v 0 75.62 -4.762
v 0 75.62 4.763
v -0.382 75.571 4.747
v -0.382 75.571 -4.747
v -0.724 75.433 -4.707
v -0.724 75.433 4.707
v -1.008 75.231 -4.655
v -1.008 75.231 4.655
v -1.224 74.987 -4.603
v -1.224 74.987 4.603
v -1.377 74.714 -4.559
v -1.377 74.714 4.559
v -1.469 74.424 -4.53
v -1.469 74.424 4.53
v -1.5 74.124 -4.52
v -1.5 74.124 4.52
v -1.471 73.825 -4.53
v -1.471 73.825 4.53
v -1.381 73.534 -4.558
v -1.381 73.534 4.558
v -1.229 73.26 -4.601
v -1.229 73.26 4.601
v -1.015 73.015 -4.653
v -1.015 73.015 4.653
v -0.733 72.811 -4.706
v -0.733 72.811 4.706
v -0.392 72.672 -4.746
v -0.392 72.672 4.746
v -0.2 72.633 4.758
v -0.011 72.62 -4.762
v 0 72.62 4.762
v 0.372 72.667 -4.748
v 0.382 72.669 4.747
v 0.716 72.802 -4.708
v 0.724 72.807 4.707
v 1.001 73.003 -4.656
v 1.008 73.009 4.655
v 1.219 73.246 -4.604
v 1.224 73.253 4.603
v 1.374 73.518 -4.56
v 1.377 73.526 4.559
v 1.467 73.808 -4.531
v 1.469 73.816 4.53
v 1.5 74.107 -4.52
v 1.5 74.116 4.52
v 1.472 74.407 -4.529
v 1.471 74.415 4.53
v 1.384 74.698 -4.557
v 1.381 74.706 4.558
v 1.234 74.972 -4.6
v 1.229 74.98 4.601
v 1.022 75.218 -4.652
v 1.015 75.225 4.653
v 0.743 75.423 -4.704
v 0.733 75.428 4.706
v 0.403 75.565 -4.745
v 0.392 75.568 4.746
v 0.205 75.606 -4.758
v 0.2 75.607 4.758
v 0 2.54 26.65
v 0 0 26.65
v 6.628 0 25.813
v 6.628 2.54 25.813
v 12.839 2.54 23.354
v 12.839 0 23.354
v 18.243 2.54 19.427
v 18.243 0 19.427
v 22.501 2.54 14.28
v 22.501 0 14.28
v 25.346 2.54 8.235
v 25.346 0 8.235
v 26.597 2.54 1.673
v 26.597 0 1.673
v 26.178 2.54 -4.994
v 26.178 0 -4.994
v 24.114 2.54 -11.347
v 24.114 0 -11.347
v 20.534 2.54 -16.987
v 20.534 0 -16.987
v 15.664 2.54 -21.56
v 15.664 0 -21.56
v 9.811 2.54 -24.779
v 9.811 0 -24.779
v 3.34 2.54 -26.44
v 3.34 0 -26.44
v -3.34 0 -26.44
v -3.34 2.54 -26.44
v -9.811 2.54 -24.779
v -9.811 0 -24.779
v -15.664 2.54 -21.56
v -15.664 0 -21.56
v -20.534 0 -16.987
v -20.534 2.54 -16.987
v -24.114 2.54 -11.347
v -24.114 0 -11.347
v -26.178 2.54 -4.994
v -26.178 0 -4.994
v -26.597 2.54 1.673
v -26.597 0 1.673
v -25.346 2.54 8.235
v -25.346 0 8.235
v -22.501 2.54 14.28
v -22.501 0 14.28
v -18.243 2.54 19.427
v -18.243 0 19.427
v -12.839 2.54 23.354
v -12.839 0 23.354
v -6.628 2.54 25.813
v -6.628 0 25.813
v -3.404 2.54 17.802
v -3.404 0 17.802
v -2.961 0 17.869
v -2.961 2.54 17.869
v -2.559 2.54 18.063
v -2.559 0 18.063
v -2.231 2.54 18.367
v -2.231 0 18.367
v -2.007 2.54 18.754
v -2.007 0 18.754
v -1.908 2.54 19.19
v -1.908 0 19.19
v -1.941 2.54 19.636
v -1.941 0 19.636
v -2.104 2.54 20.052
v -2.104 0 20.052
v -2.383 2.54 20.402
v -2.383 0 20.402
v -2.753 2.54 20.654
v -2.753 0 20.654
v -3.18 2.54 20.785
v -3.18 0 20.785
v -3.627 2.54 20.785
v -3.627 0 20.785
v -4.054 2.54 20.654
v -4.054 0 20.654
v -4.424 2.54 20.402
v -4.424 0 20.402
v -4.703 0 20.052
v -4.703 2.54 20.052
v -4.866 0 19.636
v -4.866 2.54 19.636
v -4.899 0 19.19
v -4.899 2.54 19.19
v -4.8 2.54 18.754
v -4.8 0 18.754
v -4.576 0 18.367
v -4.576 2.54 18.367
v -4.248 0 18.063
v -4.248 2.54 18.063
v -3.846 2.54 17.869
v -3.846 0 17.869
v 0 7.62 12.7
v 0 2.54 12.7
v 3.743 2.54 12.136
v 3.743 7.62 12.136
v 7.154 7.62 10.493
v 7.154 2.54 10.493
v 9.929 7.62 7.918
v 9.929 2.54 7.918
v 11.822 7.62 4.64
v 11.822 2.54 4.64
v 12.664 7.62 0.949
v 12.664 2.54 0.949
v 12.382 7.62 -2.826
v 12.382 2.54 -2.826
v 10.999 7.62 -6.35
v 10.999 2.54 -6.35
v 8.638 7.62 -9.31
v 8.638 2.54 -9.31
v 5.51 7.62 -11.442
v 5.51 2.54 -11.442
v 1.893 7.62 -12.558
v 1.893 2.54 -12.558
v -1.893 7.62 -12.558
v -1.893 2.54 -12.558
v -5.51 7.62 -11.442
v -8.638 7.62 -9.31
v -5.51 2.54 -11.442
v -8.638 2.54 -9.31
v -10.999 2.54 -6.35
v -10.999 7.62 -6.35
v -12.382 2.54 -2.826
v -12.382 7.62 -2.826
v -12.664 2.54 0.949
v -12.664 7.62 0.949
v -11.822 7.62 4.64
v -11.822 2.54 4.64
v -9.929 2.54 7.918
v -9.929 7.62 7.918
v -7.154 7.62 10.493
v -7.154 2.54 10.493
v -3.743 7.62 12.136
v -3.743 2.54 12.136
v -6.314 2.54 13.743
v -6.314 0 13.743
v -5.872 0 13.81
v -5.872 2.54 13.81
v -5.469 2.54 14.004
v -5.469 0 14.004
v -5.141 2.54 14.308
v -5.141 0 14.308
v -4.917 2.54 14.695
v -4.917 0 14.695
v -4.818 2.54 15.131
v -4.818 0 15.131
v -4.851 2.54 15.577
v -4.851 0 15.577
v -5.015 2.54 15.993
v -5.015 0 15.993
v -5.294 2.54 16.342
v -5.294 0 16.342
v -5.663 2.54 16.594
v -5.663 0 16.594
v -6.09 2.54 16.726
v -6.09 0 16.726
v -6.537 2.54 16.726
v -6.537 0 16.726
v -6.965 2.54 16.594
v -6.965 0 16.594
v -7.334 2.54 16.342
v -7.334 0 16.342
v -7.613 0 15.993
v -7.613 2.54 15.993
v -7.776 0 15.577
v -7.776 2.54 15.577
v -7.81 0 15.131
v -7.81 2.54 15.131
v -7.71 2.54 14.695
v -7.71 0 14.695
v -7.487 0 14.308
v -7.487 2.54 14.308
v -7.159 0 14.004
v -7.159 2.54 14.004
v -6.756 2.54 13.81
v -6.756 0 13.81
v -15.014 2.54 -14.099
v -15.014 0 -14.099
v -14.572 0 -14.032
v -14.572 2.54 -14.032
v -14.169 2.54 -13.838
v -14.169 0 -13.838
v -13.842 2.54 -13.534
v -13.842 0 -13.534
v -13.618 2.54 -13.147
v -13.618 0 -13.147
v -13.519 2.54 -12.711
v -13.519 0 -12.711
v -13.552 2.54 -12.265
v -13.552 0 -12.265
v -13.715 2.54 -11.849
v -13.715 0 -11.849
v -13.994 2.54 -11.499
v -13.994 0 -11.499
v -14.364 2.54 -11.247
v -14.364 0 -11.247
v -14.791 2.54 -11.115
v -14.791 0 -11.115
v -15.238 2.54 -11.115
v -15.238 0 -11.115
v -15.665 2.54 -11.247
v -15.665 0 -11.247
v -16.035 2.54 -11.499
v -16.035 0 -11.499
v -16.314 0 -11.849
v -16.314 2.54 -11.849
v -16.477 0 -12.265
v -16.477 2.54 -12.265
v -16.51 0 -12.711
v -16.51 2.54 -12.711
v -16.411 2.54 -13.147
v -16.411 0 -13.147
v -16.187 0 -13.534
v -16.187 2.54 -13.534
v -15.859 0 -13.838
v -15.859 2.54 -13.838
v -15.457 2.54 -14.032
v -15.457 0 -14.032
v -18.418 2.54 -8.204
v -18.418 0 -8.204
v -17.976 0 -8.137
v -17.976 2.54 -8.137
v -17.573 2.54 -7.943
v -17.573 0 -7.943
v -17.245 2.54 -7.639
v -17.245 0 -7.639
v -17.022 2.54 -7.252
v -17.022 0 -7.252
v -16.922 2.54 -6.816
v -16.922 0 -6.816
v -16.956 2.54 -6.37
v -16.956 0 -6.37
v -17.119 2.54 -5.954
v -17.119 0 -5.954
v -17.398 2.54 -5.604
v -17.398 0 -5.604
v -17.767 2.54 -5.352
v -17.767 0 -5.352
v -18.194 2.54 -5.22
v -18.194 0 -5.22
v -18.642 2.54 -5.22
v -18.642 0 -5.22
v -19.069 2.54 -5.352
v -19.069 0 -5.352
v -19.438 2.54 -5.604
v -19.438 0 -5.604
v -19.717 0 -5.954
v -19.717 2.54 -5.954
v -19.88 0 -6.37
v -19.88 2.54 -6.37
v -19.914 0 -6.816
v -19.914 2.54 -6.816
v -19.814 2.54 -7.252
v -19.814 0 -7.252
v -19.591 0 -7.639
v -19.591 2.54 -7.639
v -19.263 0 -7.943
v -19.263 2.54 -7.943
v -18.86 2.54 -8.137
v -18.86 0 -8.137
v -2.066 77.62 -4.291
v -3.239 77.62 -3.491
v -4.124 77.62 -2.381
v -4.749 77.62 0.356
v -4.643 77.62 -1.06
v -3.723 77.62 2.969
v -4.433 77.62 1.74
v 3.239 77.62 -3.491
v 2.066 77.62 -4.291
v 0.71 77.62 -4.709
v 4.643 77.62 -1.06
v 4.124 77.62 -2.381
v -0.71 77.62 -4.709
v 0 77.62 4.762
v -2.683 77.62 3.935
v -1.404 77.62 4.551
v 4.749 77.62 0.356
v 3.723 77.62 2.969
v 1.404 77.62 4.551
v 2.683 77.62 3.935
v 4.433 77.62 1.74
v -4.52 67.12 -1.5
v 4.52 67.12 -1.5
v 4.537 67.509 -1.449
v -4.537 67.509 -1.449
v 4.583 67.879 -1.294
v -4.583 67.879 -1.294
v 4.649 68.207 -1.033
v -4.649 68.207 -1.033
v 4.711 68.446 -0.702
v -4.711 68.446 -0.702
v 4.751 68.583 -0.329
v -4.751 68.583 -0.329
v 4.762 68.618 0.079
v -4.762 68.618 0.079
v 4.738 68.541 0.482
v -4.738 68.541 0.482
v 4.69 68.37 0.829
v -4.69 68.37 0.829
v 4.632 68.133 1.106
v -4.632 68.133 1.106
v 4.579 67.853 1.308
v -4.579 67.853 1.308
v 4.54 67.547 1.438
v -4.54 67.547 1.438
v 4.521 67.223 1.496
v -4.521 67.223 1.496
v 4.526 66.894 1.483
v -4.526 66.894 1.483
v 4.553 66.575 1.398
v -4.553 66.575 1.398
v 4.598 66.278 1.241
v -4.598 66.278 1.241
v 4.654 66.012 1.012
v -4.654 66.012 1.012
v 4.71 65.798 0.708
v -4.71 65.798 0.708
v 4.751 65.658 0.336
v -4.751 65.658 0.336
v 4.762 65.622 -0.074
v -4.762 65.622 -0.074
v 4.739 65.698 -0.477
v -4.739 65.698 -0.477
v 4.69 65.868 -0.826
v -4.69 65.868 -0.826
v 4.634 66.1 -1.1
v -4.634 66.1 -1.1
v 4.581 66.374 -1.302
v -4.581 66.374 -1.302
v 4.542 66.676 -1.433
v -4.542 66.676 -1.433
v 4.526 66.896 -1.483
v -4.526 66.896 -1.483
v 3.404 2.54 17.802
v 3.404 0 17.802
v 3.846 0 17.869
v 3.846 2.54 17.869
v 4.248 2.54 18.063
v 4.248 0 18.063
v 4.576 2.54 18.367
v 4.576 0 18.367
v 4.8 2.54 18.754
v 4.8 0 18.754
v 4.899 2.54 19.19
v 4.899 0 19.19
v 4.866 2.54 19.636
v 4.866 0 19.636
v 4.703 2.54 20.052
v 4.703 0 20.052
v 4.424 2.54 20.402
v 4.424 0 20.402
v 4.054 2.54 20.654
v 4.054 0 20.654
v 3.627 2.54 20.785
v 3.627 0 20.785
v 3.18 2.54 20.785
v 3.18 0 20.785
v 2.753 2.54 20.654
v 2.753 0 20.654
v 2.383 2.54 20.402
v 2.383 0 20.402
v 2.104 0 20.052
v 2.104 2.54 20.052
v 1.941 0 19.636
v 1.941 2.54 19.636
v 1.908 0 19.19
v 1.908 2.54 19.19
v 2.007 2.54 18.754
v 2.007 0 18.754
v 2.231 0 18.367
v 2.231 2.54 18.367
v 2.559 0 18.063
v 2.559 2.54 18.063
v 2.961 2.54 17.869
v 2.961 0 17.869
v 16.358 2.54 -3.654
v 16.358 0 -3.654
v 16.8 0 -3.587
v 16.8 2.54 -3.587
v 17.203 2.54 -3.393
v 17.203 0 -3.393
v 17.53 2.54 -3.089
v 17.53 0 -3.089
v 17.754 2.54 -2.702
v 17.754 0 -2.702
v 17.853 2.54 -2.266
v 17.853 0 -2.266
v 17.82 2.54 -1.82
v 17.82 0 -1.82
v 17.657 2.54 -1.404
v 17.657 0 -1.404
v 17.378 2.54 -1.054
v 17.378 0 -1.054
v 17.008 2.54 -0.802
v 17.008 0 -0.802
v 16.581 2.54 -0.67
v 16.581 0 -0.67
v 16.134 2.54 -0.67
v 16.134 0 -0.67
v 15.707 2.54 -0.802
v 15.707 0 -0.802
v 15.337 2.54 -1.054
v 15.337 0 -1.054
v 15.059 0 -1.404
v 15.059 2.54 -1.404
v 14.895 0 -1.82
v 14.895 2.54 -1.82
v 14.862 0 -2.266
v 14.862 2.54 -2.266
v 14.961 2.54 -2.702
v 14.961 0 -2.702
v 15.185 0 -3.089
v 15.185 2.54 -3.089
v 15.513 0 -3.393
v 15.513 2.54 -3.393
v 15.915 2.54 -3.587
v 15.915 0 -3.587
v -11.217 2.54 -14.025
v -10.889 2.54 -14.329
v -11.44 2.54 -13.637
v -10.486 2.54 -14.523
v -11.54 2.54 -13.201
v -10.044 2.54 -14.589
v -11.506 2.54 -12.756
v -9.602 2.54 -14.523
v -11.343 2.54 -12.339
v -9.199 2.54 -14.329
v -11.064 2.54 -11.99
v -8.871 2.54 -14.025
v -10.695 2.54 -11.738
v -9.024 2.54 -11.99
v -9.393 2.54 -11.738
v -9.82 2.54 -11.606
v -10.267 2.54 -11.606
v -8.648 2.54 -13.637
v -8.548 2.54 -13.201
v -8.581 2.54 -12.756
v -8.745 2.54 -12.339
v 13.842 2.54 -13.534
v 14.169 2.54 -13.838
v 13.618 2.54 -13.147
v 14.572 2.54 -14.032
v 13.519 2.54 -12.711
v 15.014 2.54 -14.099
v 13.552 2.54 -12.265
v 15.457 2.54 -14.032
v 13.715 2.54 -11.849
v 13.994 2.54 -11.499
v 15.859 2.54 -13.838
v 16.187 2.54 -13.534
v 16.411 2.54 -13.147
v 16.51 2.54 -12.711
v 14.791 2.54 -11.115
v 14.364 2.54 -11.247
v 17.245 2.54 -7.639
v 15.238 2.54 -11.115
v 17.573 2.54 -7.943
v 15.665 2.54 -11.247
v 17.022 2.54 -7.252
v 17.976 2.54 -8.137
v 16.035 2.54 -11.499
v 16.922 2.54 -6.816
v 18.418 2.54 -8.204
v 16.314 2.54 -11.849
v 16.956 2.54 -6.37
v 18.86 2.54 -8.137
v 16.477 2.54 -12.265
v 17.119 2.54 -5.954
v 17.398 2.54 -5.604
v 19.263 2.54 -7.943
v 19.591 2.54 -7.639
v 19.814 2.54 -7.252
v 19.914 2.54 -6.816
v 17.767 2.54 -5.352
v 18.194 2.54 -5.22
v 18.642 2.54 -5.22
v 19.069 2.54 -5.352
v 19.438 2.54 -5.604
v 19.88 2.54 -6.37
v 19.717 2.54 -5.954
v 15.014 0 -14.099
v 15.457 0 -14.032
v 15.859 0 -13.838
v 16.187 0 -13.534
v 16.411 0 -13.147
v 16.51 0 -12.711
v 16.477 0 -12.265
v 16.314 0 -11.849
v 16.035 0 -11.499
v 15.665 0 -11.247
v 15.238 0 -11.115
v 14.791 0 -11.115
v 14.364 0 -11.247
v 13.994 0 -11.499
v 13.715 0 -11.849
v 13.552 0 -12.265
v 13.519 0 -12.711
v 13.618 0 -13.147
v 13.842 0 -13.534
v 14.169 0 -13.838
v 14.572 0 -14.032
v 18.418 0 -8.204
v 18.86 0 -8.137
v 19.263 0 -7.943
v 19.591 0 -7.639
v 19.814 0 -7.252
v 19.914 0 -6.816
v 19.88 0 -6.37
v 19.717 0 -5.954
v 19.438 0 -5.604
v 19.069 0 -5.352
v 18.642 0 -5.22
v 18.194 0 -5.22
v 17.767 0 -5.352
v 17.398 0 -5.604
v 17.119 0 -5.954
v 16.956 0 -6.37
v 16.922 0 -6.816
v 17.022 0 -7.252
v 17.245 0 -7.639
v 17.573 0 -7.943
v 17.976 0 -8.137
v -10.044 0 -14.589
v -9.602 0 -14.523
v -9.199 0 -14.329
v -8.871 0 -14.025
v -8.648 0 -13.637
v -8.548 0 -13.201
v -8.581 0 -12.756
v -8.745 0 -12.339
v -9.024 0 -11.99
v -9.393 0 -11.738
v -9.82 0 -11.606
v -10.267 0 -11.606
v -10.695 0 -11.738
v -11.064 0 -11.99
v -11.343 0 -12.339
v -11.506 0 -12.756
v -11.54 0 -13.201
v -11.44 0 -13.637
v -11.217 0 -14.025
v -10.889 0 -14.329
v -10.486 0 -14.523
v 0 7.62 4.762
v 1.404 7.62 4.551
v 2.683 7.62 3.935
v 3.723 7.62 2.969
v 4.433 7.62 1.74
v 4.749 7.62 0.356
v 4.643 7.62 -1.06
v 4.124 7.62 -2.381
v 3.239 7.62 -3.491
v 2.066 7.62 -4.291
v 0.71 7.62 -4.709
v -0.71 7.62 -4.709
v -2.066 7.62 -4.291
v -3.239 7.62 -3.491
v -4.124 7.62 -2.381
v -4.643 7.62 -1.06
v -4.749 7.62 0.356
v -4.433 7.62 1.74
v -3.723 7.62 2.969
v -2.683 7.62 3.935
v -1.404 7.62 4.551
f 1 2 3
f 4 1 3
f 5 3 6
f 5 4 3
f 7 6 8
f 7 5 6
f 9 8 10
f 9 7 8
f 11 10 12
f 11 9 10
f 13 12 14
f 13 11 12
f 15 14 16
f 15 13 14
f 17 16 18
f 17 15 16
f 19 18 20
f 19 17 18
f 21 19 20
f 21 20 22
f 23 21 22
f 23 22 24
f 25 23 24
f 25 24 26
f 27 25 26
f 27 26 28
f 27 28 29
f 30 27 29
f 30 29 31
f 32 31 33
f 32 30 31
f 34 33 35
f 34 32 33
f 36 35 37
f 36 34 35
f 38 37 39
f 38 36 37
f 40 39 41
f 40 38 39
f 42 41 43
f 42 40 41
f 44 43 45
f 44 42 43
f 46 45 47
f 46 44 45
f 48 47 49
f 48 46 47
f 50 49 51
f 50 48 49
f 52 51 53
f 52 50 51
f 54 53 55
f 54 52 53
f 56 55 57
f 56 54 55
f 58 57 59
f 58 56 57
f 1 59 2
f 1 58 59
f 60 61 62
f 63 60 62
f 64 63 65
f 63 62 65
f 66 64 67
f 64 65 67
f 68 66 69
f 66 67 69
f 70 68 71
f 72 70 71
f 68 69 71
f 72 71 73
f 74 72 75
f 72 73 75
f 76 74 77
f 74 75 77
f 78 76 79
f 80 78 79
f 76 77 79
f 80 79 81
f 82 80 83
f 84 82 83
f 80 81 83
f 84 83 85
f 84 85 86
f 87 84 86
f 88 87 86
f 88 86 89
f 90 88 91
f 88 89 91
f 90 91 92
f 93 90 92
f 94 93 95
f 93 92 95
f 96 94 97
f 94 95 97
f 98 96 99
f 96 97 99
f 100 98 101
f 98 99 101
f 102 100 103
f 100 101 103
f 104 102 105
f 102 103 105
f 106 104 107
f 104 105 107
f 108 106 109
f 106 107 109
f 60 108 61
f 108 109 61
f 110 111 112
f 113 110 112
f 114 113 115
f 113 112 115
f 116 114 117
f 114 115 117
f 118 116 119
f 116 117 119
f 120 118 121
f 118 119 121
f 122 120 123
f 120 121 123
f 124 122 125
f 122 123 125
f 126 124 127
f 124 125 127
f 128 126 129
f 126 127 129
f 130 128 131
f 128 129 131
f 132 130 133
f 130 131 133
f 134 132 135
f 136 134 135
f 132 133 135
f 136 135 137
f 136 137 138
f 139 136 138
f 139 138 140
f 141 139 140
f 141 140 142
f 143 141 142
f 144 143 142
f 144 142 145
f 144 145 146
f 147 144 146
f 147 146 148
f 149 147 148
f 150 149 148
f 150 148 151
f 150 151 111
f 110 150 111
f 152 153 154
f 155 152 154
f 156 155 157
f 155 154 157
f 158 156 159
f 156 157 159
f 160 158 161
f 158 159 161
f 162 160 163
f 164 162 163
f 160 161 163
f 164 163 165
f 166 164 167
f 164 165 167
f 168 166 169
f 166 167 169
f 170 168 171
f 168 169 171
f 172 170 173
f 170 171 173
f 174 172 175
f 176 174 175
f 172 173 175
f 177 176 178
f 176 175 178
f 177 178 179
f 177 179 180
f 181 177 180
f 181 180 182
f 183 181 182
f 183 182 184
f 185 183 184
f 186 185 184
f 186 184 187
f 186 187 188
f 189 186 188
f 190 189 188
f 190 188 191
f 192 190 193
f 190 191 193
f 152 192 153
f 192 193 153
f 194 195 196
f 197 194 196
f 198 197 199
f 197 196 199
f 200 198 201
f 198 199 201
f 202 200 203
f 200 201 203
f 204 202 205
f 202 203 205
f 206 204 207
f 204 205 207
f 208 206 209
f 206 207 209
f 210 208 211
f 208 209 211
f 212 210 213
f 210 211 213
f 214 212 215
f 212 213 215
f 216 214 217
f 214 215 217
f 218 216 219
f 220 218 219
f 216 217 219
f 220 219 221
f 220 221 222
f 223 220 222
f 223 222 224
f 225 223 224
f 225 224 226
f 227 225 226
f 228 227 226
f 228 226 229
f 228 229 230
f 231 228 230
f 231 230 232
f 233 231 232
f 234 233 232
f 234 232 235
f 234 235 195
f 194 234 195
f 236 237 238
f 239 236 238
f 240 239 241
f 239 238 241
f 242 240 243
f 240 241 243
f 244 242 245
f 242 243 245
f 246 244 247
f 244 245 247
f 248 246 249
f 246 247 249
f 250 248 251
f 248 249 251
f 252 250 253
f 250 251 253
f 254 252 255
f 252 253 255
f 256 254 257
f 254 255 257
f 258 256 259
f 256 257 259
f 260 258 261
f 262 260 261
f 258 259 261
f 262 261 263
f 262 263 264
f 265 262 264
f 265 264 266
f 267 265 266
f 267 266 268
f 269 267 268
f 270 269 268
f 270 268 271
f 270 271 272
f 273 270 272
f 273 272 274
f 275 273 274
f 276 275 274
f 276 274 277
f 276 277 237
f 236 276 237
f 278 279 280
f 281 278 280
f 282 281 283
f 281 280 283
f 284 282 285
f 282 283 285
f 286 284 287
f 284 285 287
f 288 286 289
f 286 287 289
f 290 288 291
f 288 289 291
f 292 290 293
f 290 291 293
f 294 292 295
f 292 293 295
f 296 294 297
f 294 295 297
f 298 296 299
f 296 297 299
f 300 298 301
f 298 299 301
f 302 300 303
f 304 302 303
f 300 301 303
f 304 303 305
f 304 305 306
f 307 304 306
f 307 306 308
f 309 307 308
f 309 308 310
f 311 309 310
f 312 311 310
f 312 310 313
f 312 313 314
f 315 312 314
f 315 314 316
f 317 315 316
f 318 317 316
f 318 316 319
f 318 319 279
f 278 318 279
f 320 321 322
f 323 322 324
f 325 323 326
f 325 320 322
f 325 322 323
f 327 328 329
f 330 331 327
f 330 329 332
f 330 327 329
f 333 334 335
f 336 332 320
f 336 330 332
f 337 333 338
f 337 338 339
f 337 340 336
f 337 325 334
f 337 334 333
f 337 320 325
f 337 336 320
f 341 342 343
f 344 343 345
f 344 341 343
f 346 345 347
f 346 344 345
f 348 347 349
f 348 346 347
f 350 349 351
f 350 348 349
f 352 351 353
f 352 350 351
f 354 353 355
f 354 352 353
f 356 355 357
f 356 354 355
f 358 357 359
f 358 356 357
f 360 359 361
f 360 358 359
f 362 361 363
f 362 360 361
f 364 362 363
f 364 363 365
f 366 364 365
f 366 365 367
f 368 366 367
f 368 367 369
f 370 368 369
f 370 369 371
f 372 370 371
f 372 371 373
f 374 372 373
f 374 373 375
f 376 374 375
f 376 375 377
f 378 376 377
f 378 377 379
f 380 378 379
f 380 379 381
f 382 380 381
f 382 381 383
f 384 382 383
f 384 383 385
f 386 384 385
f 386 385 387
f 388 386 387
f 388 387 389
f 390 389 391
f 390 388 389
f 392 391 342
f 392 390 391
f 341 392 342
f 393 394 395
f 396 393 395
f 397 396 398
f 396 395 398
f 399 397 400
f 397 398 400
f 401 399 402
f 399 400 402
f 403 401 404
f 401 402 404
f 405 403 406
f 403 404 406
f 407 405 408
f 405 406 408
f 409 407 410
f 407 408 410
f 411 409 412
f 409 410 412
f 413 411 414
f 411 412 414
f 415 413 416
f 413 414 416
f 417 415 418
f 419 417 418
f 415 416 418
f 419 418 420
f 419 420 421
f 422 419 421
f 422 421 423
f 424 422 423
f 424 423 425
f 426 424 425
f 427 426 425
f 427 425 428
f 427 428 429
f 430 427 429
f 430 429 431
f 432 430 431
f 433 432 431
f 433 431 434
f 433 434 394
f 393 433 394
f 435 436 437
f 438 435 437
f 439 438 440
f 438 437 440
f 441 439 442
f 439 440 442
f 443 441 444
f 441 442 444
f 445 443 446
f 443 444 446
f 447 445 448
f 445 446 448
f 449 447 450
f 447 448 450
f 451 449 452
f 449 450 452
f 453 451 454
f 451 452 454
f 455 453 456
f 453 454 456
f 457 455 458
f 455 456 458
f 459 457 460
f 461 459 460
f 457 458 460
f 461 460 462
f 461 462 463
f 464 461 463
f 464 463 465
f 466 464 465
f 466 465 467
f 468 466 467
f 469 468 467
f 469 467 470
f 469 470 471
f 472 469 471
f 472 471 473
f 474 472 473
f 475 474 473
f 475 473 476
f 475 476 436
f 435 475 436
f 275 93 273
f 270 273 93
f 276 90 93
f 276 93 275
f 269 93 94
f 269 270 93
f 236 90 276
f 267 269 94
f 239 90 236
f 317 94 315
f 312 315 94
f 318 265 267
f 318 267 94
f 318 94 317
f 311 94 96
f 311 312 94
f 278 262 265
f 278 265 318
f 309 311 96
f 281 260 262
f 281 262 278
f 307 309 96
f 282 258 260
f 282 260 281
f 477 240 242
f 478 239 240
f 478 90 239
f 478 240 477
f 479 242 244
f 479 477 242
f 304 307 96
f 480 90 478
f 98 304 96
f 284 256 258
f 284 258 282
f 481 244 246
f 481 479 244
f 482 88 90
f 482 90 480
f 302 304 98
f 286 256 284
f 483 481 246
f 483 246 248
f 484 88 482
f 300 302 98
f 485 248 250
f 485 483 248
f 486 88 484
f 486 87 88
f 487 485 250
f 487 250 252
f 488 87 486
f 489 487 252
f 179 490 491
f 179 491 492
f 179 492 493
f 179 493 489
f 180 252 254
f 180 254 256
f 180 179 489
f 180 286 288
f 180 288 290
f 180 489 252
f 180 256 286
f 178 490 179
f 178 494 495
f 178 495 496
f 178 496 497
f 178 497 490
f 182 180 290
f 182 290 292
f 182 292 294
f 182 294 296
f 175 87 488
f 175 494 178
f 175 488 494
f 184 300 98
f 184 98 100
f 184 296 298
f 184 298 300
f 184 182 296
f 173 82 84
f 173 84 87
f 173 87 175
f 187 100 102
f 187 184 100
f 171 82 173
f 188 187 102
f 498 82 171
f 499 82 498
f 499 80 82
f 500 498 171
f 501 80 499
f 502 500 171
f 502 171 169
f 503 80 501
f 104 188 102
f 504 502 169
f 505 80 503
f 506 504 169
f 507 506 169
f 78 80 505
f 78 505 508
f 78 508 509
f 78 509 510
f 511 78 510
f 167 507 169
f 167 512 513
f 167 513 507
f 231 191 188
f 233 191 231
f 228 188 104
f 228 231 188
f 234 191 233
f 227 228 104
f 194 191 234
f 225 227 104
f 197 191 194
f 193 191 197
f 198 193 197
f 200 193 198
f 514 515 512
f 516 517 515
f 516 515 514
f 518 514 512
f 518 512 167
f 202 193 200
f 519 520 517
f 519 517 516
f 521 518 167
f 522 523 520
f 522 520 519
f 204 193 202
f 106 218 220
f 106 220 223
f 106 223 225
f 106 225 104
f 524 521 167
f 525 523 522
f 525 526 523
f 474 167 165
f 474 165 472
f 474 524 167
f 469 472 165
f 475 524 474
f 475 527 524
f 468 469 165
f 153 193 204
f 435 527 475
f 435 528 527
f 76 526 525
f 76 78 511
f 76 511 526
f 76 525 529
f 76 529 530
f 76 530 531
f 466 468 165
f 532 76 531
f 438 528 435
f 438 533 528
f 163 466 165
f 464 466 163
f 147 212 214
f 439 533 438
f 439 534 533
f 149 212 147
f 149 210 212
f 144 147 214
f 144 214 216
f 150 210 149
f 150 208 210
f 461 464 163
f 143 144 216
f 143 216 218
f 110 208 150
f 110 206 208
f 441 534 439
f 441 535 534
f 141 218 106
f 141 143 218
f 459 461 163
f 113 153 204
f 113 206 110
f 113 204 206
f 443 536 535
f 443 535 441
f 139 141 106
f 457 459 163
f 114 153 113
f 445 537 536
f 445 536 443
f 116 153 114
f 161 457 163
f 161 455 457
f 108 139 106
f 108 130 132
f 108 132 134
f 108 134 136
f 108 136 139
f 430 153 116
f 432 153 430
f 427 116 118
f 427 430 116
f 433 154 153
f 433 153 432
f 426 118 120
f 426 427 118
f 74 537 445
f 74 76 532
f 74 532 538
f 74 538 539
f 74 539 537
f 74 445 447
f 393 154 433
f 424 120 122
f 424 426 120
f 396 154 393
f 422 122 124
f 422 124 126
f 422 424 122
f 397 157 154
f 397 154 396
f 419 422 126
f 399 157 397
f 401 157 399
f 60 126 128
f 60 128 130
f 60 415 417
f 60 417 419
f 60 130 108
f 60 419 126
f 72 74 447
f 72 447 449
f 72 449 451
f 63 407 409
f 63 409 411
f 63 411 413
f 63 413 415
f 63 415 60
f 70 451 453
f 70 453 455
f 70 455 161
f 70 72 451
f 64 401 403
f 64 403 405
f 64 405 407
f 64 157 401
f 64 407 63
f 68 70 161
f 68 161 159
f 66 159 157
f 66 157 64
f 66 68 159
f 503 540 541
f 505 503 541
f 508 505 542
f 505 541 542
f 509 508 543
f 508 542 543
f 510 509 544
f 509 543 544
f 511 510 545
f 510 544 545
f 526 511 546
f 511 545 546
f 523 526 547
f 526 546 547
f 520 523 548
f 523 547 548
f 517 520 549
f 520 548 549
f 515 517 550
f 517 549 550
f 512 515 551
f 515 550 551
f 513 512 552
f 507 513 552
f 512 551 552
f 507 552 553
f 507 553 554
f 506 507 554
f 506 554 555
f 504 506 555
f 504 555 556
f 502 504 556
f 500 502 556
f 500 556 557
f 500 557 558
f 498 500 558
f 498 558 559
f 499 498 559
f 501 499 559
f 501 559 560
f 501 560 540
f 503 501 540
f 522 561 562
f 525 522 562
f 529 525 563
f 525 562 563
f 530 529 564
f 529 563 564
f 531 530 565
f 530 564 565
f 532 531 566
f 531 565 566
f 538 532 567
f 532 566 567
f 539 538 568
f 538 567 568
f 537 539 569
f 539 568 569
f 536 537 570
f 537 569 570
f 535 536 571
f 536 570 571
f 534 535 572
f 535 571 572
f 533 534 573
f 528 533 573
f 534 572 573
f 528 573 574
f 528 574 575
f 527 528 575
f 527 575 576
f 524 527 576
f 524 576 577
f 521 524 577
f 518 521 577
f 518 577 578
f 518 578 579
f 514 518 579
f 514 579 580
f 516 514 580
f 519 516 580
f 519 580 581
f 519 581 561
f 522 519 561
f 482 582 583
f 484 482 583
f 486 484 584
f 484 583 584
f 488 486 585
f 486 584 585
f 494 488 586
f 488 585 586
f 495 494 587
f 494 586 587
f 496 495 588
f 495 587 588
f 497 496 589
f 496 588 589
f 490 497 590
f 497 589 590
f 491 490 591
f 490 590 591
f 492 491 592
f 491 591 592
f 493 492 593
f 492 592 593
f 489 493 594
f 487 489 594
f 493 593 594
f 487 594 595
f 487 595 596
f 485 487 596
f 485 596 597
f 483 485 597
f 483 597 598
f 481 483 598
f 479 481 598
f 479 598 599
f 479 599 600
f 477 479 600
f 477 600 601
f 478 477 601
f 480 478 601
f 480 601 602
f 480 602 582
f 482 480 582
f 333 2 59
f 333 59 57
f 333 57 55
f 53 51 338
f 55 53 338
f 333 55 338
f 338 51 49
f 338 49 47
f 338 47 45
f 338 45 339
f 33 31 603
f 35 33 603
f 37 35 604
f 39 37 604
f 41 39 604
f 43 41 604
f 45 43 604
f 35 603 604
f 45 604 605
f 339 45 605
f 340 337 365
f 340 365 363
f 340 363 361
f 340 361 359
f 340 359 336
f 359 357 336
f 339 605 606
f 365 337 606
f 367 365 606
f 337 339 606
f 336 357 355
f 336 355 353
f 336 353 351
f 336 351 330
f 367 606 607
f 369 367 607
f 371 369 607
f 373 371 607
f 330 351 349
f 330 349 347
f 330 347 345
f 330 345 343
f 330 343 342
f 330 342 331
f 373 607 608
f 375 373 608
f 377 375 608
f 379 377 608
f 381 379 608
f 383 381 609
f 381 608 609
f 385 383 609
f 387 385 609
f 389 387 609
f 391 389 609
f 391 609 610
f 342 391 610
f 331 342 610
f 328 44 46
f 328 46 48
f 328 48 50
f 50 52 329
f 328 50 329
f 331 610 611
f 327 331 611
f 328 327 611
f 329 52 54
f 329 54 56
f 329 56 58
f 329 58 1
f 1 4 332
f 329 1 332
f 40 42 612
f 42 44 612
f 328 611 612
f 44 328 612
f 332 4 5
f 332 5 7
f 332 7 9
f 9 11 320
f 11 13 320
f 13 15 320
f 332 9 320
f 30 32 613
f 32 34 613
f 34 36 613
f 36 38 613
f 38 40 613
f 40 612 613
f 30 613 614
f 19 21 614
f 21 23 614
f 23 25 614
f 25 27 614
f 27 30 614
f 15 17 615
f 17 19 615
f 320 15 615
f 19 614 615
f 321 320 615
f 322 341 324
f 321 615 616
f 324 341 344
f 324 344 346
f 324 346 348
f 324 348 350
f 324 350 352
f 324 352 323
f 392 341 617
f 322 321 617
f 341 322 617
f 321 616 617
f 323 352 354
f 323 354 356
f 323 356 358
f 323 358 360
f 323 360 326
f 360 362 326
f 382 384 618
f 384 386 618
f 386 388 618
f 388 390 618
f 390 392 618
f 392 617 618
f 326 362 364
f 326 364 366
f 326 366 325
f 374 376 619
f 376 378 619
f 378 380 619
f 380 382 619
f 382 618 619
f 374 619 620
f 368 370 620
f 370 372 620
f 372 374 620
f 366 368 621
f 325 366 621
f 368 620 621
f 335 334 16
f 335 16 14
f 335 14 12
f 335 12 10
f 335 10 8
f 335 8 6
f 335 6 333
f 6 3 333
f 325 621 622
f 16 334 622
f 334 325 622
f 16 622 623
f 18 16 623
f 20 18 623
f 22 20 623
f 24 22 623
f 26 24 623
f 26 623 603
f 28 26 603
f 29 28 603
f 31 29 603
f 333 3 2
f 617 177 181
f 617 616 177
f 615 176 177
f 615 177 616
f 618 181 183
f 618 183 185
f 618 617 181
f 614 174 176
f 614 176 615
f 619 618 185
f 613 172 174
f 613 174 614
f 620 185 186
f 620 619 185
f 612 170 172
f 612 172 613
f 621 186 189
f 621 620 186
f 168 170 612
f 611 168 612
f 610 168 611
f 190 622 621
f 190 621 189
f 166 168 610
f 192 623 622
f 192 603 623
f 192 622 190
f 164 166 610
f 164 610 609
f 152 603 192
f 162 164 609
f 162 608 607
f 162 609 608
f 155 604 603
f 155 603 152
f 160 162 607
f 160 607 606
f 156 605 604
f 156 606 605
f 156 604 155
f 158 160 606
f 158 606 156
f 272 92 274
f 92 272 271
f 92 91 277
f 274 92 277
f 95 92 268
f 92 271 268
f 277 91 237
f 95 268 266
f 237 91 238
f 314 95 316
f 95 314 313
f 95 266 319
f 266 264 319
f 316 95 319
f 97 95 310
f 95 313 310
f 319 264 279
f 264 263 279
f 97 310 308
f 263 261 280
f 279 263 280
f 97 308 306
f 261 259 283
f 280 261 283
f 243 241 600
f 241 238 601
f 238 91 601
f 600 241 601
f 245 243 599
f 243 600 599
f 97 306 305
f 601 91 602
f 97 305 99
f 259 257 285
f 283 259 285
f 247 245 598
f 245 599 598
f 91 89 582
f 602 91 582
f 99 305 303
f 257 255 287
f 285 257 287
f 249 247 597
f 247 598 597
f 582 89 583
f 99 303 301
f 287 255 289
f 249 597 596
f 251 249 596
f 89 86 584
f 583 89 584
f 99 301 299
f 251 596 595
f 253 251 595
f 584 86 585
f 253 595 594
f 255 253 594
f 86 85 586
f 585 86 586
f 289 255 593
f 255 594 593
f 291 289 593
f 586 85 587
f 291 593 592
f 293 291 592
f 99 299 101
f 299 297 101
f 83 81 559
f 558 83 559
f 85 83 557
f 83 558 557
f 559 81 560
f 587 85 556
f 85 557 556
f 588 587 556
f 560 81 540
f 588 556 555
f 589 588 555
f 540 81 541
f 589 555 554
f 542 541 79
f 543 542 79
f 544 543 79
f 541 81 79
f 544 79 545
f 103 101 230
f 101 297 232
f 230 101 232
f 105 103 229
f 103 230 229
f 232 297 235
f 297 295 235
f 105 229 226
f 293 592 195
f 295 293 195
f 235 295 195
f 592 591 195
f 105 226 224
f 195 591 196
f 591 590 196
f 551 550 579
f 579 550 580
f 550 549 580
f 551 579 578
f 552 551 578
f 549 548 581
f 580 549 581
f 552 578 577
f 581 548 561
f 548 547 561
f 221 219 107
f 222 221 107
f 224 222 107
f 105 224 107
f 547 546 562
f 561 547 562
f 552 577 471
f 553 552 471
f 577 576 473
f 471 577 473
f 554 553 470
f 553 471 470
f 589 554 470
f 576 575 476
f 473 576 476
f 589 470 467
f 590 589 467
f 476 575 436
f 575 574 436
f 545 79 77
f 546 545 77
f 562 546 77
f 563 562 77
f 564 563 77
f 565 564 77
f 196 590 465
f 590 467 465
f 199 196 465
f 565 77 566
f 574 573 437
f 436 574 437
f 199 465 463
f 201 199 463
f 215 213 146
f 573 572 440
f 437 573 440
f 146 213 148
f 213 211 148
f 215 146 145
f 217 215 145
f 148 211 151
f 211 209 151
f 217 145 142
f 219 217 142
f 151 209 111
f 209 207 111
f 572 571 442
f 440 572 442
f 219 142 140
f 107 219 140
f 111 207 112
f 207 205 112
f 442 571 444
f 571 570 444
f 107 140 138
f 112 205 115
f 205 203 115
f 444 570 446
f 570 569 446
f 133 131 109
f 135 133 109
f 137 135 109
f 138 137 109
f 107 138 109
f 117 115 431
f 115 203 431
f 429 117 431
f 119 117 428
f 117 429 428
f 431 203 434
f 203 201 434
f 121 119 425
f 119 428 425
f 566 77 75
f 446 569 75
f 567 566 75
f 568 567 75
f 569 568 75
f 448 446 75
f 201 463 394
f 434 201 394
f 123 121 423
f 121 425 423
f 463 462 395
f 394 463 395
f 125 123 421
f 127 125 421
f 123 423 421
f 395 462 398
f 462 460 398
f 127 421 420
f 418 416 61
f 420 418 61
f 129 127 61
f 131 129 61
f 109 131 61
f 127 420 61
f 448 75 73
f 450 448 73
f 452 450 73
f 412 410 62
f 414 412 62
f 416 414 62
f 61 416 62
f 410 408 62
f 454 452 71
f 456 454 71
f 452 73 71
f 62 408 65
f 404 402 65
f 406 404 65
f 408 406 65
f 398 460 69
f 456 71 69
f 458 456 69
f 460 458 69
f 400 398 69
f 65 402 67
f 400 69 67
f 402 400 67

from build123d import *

# Parameters (mm, degrees)
SKETCH1_R               = 26.65
BOSS_EXTRUDE1_DEPTH     = 2.54
SKETCH2_R               = 12.7
BOSS_EXTRUDE2_DEPTH     = 5.08
SKETCH4_R               = 4.7625
BOSS_EXTRUDE3_DEPTH     = 70
SKETCH6_R               = 1.5
CUT_EXTRUDE2_DEPTH      = 87.286206314
CUT_EXTRUDE3_DEPTH      = 87.286206314
CUT_EXTRUDE3_DEPTH_BACK = 87.286206314
SKETCH7_R               = 1.5
CUT_EXTRUDE4_DEPTH      = 87.286206404
CUT_EXTRUDE4_DEPTH_BACK = 87.286206404
SKETCH8_R               = 1.5


with BuildPart() as part:
    # Sketch1 → Boss-Extrude1 (new body)
    with BuildSketch(Plane(origin=(0, 0, 0), x_dir=(1, 0, 0), z_dir=(0, 1, 0))):
        with Locations(Location((0, 0, 0), (0, 0, 270))):
            Circle(SKETCH1_R)
    extrude(amount=BOSS_EXTRUDE1_DEPTH)

    # Sketch2 → Boss-Extrude2 (add)
    with BuildSketch(Plane(origin=(0, 2.54, 0), x_dir=(1, 0, 0), z_dir=(0, 1, 0))):
        with Locations(Location((0, 0, 0), (0, 0, 270))):
            Circle(SKETCH2_R)
    extrude(amount=BOSS_EXTRUDE2_DEPTH)

    # Sketch4 → Boss-Extrude3 (add)
    with BuildSketch(Plane(origin=(0, 7.62, 0), x_dir=(1, 0, 0), z_dir=(0, 1, 0))):
        with Locations(Location((0, 0, 0), (0, 0, 270))):
            Circle(SKETCH4_R)
    extrude(amount=BOSS_EXTRUDE3_DEPTH)

    # Sketch6 → Cut-Extrude2 (cut, through all)
    with BuildSketch(Plane(origin=(0, 0, 0), x_dir=(-1, 0, 0), z_dir=(0, -1, 0))):
        with Locations(Location((6.313805851, -15.242875716, 0), (0, 0, 90))):
            Circle(SKETCH6_R)
        with Locations(Location((-16.357620523, 2.153521596, 0), (0, 0, 90))):
            Circle(SKETCH6_R)
        with Locations(Location((10.043814672, 13.08935412, 0), (0, 0, 90))):
            Circle(SKETCH6_R)
        with Locations(Location((-3.403504282, -19.302231959, 0), (0, 0, 90))):
            Circle(SKETCH6_R)
        with Locations(Location((-18.417975367, 6.703594809, 0), (0, 0, 90))):
            Circle(SKETCH6_R)
        with Locations(Location((-15.014471085, 12.59863715, 0), (0, 0, 90))):
            Circle(SKETCH6_R)
        with Locations(Location((15.014471085, 12.59863715, 0), (0, 0, 90))):
            Circle(SKETCH6_R)
        with Locations(Location((18.417975367, 6.703594809, 0), (0, 0, 90))):
            Circle(SKETCH6_R)
        with Locations(Location((3.403504282, -19.302231959, 0), (0, 0, 90))):
            Circle(SKETCH6_R)
    extrude(amount=-CUT_EXTRUDE2_DEPTH, mode=Mode.SUBTRACT)

    # Sketch7 → Cut-Extrude3 (cut, two sides: drawn at the far end of the back side and taken through both)
    with BuildSketch(Plane.XY.offset(-CUT_EXTRUDE3_DEPTH_BACK)):
        with Locations(Location((0, 74.12, 0), (0, 0, 90.00000001))):
            Circle(SKETCH7_R)
    extrude(amount=CUT_EXTRUDE3_DEPTH + CUT_EXTRUDE3_DEPTH_BACK, mode=Mode.SUBTRACT)

    # Sketch8 → Cut-Extrude4 (cut, two sides: drawn at the far end of the back side and taken through both)
    with BuildSketch(Plane(origin=(0, 0, 0), x_dir=(0, 0, -1), z_dir=(1, 0, 0)).offset(-CUT_EXTRUDE4_DEPTH_BACK)):
        with Locations((0, 67.12)):
            Circle(SKETCH8_R)
    extrude(amount=CUT_EXTRUDE4_DEPTH + CUT_EXTRUDE4_DEPTH_BACK, mode=Mode.SUBTRACT)


solid = part.part
